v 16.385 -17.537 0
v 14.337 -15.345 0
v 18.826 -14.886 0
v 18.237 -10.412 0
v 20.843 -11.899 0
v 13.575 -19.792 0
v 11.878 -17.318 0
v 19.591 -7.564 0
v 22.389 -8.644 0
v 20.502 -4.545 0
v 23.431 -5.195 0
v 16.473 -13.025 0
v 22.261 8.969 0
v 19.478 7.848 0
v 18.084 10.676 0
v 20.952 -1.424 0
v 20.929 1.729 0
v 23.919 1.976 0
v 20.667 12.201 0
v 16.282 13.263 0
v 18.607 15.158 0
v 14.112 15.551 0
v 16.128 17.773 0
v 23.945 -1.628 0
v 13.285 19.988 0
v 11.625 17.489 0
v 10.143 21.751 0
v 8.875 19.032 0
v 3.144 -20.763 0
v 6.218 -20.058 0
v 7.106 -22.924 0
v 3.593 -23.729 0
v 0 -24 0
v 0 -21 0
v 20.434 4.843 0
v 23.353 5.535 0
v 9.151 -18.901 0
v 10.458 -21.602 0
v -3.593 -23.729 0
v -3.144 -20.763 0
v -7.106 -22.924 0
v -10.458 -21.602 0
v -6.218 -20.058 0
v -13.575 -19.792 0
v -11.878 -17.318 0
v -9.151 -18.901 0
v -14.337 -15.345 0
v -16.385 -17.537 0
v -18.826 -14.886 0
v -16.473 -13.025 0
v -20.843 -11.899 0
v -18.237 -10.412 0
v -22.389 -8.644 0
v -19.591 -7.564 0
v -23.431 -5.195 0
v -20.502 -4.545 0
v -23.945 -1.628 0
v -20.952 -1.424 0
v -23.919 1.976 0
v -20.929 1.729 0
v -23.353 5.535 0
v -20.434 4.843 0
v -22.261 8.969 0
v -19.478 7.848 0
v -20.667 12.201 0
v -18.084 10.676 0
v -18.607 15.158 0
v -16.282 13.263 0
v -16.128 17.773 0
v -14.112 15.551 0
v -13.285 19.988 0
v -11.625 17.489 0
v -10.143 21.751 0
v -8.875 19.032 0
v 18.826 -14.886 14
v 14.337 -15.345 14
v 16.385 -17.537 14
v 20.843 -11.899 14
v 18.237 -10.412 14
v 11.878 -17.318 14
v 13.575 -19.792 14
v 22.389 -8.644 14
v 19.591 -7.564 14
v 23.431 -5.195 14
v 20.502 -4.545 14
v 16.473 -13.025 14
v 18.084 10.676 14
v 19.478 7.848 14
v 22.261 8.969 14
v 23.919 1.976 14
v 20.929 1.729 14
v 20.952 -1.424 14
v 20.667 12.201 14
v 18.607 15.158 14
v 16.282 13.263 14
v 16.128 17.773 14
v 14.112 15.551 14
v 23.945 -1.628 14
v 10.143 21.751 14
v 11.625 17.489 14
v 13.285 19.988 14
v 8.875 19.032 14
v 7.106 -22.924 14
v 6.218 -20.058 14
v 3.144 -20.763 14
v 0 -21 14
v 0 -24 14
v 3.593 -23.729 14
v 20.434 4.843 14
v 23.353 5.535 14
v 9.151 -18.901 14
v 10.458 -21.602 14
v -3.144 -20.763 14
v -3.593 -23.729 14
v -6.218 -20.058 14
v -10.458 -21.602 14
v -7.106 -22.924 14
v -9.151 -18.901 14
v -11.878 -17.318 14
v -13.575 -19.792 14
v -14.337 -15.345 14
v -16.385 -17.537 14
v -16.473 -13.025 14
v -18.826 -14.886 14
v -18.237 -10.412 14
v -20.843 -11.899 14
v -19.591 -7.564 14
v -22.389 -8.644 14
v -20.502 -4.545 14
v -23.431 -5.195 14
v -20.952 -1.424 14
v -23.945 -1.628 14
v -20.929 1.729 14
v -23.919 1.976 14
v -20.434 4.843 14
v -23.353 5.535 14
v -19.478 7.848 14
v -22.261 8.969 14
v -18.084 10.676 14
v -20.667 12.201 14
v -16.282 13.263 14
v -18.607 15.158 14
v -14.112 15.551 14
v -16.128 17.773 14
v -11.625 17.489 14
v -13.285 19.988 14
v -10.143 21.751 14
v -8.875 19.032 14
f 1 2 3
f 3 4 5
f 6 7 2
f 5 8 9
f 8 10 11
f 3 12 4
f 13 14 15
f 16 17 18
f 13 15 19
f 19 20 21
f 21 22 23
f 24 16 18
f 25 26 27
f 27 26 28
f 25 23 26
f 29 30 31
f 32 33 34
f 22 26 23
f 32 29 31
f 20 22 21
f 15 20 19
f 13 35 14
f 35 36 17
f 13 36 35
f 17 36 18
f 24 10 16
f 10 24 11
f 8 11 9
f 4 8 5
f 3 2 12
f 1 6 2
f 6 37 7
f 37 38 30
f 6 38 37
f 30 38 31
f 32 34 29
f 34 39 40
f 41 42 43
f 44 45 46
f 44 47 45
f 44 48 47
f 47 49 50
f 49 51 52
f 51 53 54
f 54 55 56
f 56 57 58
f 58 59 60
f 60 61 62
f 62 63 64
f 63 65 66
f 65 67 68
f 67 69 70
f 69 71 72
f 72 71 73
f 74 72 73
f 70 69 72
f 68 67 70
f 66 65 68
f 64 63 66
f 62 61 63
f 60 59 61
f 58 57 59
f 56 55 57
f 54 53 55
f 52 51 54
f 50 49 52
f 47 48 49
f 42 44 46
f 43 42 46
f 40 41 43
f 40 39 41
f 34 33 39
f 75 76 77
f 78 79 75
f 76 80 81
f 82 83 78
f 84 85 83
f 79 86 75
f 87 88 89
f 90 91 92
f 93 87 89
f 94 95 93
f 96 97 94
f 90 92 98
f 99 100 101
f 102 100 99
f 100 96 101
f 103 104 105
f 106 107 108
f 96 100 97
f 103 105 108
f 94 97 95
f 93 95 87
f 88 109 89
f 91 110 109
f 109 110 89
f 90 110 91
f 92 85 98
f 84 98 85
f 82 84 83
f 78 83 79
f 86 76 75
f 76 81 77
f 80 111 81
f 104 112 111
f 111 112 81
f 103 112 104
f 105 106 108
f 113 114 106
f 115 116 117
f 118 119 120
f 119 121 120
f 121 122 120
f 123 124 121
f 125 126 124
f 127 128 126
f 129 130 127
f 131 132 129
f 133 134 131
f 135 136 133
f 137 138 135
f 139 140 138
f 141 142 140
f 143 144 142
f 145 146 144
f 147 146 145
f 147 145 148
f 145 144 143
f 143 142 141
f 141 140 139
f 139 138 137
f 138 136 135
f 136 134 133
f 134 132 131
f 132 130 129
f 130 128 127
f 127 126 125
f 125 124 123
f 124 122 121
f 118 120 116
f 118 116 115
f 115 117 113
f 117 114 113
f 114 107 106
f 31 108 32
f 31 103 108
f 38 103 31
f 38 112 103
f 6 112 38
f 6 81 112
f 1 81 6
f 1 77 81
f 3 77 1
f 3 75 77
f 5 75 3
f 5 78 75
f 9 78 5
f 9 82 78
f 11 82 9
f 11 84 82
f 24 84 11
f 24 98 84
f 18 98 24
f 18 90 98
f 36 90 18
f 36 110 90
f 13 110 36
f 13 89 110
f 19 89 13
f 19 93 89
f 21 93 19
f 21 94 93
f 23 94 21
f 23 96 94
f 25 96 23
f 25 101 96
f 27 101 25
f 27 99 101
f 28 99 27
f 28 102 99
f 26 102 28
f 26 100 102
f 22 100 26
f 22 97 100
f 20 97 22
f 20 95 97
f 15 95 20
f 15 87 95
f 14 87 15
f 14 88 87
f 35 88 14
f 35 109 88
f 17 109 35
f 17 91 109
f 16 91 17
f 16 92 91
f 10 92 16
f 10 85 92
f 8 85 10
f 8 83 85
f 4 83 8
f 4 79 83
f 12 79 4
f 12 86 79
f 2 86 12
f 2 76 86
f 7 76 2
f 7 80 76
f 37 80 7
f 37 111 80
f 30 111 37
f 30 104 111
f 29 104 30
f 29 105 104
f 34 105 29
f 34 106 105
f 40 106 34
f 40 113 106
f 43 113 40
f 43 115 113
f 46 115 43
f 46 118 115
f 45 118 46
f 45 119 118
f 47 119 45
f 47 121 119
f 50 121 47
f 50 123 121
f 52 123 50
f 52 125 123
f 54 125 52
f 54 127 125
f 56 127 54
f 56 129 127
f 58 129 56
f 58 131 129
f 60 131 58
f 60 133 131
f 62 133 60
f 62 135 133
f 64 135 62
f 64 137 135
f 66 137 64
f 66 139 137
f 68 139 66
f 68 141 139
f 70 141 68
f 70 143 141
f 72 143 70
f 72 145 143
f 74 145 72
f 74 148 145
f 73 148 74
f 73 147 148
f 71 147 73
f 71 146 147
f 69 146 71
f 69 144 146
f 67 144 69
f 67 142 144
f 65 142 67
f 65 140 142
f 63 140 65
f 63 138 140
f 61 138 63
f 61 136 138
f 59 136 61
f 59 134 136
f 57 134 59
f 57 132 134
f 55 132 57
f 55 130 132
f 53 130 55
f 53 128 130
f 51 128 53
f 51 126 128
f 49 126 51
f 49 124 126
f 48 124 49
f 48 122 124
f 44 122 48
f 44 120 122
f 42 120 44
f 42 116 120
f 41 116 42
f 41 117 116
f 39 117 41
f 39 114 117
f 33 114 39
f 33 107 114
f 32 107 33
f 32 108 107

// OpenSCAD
$fn = 32;

// ----------------------------------------------------------------------
// Spring clip: 48 mm outside, 3 mm band, 50 degree opening
// ----------------------------------------------------------------------

// --- parameters (mm) ---
outer_r = 24;             // clip outside radius
inner_r = 21;             // clip bore radius
band = 3;                 // band thickness
clip_w = 14;              // clip width
opening = 50;             // opening angle

clip_profile = [[-10.143, 21.751], [-13.285, 19.988], [-16.128, 17.773], [-18.607, 15.158], [-20.667, 12.201], [-22.261, 8.969], [-23.353, 5.535], [-23.919, 1.976], [-23.945, -1.628], [-23.431, -5.195], [-22.389, -8.644], [-20.843, -11.899], [-18.826, -14.886], [-16.385, -17.537], [-13.575, -19.792], [-10.458, -21.602], [-7.106, -22.924], [-3.593, -23.729], [0, -24], [3.593, -23.729], [7.106, -22.924], [10.458, -21.602], [13.575, -19.792], [16.385, -17.537], [18.826, -14.886], [20.843, -11.899], [22.389, -8.644], [23.431, -5.195], [23.945, -1.628], [23.919, 1.976], [23.353, 5.535], [22.261, 8.969], [20.667, 12.201], [18.607, 15.158], [16.128, 17.773], [13.285, 19.988], [10.143, 21.751], [8.875, 19.032], [11.625, 17.489], [14.112, 15.551], [16.282, 13.263], [18.084, 10.676], [19.478, 7.848], [20.434, 4.843], [20.929, 1.729], [20.952, -1.424], [20.502, -4.545], [19.591, -7.564], [18.237, -10.412], [16.473, -13.025], [14.337, -15.345], [11.878, -17.318], [9.151, -18.901], [6.218, -20.058], [3.144, -20.763], [0, -21], [-3.144, -20.763], [-6.218, -20.058], [-9.151, -18.901], [-11.878, -17.318], [-14.337, -15.345], [-16.473, -13.025], [-18.237, -10.412], [-19.591, -7.564], [-20.502, -4.545], [-20.952, -1.424], [-20.929, 1.729], [-20.434, 4.843], [-19.478, 7.848], [-18.084, 10.676], [-16.282, 13.263], [-14.112, 15.551], [-11.625, 17.489], [-8.875, 19.032]];

difference() {
  union() {
    linear_extrude(height = clip_w) polygon(clip_profile);
  }
}
